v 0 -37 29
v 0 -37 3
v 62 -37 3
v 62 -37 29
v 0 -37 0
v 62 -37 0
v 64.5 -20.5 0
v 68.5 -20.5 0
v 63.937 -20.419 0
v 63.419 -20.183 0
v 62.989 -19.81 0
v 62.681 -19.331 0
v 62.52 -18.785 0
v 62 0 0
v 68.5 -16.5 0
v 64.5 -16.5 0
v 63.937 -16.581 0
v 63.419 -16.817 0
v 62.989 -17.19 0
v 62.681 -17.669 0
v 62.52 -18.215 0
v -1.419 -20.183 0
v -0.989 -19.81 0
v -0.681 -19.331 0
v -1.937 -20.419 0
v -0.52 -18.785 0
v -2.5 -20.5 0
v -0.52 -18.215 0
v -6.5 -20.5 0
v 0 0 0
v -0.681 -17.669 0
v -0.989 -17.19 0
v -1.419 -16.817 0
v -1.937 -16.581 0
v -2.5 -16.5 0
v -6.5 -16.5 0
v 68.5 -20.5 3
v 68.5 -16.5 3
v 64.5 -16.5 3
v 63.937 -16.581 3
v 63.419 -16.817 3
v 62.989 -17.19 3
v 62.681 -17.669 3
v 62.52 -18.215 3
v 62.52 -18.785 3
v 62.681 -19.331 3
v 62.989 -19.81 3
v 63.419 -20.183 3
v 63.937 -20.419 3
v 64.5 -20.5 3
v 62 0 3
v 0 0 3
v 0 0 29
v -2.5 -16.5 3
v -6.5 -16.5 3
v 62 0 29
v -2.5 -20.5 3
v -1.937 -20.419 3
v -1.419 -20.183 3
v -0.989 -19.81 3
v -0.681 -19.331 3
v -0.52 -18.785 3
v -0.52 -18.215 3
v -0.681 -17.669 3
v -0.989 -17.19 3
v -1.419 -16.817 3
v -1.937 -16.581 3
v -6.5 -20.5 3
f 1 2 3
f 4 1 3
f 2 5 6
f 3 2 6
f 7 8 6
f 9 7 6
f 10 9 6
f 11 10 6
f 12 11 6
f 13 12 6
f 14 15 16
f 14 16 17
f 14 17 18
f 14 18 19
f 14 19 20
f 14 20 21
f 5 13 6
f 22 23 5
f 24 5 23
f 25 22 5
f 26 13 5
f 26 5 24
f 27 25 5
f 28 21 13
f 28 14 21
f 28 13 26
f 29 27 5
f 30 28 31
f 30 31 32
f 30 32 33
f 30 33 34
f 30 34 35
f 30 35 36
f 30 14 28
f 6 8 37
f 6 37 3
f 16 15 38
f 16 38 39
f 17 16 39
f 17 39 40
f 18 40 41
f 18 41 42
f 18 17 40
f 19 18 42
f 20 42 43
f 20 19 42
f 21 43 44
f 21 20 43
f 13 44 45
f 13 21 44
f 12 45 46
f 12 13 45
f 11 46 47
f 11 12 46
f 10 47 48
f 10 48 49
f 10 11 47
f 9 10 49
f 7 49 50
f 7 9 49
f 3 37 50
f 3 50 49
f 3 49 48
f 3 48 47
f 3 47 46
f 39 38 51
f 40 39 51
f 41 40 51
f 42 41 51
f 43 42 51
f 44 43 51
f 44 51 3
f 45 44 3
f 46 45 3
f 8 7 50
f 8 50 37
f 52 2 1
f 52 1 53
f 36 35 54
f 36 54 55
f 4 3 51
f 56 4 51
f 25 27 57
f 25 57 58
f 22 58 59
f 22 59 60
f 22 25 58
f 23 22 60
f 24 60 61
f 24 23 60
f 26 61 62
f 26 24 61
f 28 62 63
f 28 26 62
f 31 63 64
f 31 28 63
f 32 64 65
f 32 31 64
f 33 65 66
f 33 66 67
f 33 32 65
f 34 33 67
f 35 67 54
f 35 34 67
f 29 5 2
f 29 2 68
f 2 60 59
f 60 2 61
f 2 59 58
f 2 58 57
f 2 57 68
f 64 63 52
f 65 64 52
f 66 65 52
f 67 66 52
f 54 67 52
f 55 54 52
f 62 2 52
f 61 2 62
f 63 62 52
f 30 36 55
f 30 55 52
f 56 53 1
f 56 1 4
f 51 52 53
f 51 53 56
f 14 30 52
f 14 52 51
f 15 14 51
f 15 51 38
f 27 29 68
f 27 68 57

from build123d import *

# Parameters (mm, degrees)
EXTRUDE_1_DEPTH = 3
SKETCH_2_W      = 62
SKETCH_2_H      = 37
EXTRUDE_2_DEPTH = 26


with BuildPart() as part:
    # 草图1 → 凸台-拉伸1 (new body)
    with BuildSketch(Plane.XY):
        with BuildLine():
            Line((0, 0), (62, 0))
            Line((62, 0), (68.5, -16.5))
            Line((68.5, -16.5), (64.5, -16.5))
            ThreePointArc((64.5, -16.5), (62.5, -18.5), (64.5, -20.5))
            Line((64.5, -20.5), (68.5, -20.5))
            Line((68.5, -20.5), (62, -37))
            Line((62, -37), (0, -37))
            Line((0, -37), (-6.5, -20.5))
            Line((-6.5, -20.5), (-2.5, -20.5))
            ThreePointArc((-2.5, -20.5), (-0.5, -18.5), (-2.5, -16.5))
            Line((-2.5, -16.5), (-6.5, -16.5))
            Line((-6.5, -16.5), (0, 0))
        make_face()
    extrude(amount=EXTRUDE_1_DEPTH)

    # 草图2 → 凸台-拉伸2 (add)
    with BuildSketch(Plane.XY.offset(3)):
        with Locations((31, -18.5)):
            Rectangle(SKETCH_2_W, SKETCH_2_H)
    extrude(amount=EXTRUDE_2_DEPTH)


solid = part.part
